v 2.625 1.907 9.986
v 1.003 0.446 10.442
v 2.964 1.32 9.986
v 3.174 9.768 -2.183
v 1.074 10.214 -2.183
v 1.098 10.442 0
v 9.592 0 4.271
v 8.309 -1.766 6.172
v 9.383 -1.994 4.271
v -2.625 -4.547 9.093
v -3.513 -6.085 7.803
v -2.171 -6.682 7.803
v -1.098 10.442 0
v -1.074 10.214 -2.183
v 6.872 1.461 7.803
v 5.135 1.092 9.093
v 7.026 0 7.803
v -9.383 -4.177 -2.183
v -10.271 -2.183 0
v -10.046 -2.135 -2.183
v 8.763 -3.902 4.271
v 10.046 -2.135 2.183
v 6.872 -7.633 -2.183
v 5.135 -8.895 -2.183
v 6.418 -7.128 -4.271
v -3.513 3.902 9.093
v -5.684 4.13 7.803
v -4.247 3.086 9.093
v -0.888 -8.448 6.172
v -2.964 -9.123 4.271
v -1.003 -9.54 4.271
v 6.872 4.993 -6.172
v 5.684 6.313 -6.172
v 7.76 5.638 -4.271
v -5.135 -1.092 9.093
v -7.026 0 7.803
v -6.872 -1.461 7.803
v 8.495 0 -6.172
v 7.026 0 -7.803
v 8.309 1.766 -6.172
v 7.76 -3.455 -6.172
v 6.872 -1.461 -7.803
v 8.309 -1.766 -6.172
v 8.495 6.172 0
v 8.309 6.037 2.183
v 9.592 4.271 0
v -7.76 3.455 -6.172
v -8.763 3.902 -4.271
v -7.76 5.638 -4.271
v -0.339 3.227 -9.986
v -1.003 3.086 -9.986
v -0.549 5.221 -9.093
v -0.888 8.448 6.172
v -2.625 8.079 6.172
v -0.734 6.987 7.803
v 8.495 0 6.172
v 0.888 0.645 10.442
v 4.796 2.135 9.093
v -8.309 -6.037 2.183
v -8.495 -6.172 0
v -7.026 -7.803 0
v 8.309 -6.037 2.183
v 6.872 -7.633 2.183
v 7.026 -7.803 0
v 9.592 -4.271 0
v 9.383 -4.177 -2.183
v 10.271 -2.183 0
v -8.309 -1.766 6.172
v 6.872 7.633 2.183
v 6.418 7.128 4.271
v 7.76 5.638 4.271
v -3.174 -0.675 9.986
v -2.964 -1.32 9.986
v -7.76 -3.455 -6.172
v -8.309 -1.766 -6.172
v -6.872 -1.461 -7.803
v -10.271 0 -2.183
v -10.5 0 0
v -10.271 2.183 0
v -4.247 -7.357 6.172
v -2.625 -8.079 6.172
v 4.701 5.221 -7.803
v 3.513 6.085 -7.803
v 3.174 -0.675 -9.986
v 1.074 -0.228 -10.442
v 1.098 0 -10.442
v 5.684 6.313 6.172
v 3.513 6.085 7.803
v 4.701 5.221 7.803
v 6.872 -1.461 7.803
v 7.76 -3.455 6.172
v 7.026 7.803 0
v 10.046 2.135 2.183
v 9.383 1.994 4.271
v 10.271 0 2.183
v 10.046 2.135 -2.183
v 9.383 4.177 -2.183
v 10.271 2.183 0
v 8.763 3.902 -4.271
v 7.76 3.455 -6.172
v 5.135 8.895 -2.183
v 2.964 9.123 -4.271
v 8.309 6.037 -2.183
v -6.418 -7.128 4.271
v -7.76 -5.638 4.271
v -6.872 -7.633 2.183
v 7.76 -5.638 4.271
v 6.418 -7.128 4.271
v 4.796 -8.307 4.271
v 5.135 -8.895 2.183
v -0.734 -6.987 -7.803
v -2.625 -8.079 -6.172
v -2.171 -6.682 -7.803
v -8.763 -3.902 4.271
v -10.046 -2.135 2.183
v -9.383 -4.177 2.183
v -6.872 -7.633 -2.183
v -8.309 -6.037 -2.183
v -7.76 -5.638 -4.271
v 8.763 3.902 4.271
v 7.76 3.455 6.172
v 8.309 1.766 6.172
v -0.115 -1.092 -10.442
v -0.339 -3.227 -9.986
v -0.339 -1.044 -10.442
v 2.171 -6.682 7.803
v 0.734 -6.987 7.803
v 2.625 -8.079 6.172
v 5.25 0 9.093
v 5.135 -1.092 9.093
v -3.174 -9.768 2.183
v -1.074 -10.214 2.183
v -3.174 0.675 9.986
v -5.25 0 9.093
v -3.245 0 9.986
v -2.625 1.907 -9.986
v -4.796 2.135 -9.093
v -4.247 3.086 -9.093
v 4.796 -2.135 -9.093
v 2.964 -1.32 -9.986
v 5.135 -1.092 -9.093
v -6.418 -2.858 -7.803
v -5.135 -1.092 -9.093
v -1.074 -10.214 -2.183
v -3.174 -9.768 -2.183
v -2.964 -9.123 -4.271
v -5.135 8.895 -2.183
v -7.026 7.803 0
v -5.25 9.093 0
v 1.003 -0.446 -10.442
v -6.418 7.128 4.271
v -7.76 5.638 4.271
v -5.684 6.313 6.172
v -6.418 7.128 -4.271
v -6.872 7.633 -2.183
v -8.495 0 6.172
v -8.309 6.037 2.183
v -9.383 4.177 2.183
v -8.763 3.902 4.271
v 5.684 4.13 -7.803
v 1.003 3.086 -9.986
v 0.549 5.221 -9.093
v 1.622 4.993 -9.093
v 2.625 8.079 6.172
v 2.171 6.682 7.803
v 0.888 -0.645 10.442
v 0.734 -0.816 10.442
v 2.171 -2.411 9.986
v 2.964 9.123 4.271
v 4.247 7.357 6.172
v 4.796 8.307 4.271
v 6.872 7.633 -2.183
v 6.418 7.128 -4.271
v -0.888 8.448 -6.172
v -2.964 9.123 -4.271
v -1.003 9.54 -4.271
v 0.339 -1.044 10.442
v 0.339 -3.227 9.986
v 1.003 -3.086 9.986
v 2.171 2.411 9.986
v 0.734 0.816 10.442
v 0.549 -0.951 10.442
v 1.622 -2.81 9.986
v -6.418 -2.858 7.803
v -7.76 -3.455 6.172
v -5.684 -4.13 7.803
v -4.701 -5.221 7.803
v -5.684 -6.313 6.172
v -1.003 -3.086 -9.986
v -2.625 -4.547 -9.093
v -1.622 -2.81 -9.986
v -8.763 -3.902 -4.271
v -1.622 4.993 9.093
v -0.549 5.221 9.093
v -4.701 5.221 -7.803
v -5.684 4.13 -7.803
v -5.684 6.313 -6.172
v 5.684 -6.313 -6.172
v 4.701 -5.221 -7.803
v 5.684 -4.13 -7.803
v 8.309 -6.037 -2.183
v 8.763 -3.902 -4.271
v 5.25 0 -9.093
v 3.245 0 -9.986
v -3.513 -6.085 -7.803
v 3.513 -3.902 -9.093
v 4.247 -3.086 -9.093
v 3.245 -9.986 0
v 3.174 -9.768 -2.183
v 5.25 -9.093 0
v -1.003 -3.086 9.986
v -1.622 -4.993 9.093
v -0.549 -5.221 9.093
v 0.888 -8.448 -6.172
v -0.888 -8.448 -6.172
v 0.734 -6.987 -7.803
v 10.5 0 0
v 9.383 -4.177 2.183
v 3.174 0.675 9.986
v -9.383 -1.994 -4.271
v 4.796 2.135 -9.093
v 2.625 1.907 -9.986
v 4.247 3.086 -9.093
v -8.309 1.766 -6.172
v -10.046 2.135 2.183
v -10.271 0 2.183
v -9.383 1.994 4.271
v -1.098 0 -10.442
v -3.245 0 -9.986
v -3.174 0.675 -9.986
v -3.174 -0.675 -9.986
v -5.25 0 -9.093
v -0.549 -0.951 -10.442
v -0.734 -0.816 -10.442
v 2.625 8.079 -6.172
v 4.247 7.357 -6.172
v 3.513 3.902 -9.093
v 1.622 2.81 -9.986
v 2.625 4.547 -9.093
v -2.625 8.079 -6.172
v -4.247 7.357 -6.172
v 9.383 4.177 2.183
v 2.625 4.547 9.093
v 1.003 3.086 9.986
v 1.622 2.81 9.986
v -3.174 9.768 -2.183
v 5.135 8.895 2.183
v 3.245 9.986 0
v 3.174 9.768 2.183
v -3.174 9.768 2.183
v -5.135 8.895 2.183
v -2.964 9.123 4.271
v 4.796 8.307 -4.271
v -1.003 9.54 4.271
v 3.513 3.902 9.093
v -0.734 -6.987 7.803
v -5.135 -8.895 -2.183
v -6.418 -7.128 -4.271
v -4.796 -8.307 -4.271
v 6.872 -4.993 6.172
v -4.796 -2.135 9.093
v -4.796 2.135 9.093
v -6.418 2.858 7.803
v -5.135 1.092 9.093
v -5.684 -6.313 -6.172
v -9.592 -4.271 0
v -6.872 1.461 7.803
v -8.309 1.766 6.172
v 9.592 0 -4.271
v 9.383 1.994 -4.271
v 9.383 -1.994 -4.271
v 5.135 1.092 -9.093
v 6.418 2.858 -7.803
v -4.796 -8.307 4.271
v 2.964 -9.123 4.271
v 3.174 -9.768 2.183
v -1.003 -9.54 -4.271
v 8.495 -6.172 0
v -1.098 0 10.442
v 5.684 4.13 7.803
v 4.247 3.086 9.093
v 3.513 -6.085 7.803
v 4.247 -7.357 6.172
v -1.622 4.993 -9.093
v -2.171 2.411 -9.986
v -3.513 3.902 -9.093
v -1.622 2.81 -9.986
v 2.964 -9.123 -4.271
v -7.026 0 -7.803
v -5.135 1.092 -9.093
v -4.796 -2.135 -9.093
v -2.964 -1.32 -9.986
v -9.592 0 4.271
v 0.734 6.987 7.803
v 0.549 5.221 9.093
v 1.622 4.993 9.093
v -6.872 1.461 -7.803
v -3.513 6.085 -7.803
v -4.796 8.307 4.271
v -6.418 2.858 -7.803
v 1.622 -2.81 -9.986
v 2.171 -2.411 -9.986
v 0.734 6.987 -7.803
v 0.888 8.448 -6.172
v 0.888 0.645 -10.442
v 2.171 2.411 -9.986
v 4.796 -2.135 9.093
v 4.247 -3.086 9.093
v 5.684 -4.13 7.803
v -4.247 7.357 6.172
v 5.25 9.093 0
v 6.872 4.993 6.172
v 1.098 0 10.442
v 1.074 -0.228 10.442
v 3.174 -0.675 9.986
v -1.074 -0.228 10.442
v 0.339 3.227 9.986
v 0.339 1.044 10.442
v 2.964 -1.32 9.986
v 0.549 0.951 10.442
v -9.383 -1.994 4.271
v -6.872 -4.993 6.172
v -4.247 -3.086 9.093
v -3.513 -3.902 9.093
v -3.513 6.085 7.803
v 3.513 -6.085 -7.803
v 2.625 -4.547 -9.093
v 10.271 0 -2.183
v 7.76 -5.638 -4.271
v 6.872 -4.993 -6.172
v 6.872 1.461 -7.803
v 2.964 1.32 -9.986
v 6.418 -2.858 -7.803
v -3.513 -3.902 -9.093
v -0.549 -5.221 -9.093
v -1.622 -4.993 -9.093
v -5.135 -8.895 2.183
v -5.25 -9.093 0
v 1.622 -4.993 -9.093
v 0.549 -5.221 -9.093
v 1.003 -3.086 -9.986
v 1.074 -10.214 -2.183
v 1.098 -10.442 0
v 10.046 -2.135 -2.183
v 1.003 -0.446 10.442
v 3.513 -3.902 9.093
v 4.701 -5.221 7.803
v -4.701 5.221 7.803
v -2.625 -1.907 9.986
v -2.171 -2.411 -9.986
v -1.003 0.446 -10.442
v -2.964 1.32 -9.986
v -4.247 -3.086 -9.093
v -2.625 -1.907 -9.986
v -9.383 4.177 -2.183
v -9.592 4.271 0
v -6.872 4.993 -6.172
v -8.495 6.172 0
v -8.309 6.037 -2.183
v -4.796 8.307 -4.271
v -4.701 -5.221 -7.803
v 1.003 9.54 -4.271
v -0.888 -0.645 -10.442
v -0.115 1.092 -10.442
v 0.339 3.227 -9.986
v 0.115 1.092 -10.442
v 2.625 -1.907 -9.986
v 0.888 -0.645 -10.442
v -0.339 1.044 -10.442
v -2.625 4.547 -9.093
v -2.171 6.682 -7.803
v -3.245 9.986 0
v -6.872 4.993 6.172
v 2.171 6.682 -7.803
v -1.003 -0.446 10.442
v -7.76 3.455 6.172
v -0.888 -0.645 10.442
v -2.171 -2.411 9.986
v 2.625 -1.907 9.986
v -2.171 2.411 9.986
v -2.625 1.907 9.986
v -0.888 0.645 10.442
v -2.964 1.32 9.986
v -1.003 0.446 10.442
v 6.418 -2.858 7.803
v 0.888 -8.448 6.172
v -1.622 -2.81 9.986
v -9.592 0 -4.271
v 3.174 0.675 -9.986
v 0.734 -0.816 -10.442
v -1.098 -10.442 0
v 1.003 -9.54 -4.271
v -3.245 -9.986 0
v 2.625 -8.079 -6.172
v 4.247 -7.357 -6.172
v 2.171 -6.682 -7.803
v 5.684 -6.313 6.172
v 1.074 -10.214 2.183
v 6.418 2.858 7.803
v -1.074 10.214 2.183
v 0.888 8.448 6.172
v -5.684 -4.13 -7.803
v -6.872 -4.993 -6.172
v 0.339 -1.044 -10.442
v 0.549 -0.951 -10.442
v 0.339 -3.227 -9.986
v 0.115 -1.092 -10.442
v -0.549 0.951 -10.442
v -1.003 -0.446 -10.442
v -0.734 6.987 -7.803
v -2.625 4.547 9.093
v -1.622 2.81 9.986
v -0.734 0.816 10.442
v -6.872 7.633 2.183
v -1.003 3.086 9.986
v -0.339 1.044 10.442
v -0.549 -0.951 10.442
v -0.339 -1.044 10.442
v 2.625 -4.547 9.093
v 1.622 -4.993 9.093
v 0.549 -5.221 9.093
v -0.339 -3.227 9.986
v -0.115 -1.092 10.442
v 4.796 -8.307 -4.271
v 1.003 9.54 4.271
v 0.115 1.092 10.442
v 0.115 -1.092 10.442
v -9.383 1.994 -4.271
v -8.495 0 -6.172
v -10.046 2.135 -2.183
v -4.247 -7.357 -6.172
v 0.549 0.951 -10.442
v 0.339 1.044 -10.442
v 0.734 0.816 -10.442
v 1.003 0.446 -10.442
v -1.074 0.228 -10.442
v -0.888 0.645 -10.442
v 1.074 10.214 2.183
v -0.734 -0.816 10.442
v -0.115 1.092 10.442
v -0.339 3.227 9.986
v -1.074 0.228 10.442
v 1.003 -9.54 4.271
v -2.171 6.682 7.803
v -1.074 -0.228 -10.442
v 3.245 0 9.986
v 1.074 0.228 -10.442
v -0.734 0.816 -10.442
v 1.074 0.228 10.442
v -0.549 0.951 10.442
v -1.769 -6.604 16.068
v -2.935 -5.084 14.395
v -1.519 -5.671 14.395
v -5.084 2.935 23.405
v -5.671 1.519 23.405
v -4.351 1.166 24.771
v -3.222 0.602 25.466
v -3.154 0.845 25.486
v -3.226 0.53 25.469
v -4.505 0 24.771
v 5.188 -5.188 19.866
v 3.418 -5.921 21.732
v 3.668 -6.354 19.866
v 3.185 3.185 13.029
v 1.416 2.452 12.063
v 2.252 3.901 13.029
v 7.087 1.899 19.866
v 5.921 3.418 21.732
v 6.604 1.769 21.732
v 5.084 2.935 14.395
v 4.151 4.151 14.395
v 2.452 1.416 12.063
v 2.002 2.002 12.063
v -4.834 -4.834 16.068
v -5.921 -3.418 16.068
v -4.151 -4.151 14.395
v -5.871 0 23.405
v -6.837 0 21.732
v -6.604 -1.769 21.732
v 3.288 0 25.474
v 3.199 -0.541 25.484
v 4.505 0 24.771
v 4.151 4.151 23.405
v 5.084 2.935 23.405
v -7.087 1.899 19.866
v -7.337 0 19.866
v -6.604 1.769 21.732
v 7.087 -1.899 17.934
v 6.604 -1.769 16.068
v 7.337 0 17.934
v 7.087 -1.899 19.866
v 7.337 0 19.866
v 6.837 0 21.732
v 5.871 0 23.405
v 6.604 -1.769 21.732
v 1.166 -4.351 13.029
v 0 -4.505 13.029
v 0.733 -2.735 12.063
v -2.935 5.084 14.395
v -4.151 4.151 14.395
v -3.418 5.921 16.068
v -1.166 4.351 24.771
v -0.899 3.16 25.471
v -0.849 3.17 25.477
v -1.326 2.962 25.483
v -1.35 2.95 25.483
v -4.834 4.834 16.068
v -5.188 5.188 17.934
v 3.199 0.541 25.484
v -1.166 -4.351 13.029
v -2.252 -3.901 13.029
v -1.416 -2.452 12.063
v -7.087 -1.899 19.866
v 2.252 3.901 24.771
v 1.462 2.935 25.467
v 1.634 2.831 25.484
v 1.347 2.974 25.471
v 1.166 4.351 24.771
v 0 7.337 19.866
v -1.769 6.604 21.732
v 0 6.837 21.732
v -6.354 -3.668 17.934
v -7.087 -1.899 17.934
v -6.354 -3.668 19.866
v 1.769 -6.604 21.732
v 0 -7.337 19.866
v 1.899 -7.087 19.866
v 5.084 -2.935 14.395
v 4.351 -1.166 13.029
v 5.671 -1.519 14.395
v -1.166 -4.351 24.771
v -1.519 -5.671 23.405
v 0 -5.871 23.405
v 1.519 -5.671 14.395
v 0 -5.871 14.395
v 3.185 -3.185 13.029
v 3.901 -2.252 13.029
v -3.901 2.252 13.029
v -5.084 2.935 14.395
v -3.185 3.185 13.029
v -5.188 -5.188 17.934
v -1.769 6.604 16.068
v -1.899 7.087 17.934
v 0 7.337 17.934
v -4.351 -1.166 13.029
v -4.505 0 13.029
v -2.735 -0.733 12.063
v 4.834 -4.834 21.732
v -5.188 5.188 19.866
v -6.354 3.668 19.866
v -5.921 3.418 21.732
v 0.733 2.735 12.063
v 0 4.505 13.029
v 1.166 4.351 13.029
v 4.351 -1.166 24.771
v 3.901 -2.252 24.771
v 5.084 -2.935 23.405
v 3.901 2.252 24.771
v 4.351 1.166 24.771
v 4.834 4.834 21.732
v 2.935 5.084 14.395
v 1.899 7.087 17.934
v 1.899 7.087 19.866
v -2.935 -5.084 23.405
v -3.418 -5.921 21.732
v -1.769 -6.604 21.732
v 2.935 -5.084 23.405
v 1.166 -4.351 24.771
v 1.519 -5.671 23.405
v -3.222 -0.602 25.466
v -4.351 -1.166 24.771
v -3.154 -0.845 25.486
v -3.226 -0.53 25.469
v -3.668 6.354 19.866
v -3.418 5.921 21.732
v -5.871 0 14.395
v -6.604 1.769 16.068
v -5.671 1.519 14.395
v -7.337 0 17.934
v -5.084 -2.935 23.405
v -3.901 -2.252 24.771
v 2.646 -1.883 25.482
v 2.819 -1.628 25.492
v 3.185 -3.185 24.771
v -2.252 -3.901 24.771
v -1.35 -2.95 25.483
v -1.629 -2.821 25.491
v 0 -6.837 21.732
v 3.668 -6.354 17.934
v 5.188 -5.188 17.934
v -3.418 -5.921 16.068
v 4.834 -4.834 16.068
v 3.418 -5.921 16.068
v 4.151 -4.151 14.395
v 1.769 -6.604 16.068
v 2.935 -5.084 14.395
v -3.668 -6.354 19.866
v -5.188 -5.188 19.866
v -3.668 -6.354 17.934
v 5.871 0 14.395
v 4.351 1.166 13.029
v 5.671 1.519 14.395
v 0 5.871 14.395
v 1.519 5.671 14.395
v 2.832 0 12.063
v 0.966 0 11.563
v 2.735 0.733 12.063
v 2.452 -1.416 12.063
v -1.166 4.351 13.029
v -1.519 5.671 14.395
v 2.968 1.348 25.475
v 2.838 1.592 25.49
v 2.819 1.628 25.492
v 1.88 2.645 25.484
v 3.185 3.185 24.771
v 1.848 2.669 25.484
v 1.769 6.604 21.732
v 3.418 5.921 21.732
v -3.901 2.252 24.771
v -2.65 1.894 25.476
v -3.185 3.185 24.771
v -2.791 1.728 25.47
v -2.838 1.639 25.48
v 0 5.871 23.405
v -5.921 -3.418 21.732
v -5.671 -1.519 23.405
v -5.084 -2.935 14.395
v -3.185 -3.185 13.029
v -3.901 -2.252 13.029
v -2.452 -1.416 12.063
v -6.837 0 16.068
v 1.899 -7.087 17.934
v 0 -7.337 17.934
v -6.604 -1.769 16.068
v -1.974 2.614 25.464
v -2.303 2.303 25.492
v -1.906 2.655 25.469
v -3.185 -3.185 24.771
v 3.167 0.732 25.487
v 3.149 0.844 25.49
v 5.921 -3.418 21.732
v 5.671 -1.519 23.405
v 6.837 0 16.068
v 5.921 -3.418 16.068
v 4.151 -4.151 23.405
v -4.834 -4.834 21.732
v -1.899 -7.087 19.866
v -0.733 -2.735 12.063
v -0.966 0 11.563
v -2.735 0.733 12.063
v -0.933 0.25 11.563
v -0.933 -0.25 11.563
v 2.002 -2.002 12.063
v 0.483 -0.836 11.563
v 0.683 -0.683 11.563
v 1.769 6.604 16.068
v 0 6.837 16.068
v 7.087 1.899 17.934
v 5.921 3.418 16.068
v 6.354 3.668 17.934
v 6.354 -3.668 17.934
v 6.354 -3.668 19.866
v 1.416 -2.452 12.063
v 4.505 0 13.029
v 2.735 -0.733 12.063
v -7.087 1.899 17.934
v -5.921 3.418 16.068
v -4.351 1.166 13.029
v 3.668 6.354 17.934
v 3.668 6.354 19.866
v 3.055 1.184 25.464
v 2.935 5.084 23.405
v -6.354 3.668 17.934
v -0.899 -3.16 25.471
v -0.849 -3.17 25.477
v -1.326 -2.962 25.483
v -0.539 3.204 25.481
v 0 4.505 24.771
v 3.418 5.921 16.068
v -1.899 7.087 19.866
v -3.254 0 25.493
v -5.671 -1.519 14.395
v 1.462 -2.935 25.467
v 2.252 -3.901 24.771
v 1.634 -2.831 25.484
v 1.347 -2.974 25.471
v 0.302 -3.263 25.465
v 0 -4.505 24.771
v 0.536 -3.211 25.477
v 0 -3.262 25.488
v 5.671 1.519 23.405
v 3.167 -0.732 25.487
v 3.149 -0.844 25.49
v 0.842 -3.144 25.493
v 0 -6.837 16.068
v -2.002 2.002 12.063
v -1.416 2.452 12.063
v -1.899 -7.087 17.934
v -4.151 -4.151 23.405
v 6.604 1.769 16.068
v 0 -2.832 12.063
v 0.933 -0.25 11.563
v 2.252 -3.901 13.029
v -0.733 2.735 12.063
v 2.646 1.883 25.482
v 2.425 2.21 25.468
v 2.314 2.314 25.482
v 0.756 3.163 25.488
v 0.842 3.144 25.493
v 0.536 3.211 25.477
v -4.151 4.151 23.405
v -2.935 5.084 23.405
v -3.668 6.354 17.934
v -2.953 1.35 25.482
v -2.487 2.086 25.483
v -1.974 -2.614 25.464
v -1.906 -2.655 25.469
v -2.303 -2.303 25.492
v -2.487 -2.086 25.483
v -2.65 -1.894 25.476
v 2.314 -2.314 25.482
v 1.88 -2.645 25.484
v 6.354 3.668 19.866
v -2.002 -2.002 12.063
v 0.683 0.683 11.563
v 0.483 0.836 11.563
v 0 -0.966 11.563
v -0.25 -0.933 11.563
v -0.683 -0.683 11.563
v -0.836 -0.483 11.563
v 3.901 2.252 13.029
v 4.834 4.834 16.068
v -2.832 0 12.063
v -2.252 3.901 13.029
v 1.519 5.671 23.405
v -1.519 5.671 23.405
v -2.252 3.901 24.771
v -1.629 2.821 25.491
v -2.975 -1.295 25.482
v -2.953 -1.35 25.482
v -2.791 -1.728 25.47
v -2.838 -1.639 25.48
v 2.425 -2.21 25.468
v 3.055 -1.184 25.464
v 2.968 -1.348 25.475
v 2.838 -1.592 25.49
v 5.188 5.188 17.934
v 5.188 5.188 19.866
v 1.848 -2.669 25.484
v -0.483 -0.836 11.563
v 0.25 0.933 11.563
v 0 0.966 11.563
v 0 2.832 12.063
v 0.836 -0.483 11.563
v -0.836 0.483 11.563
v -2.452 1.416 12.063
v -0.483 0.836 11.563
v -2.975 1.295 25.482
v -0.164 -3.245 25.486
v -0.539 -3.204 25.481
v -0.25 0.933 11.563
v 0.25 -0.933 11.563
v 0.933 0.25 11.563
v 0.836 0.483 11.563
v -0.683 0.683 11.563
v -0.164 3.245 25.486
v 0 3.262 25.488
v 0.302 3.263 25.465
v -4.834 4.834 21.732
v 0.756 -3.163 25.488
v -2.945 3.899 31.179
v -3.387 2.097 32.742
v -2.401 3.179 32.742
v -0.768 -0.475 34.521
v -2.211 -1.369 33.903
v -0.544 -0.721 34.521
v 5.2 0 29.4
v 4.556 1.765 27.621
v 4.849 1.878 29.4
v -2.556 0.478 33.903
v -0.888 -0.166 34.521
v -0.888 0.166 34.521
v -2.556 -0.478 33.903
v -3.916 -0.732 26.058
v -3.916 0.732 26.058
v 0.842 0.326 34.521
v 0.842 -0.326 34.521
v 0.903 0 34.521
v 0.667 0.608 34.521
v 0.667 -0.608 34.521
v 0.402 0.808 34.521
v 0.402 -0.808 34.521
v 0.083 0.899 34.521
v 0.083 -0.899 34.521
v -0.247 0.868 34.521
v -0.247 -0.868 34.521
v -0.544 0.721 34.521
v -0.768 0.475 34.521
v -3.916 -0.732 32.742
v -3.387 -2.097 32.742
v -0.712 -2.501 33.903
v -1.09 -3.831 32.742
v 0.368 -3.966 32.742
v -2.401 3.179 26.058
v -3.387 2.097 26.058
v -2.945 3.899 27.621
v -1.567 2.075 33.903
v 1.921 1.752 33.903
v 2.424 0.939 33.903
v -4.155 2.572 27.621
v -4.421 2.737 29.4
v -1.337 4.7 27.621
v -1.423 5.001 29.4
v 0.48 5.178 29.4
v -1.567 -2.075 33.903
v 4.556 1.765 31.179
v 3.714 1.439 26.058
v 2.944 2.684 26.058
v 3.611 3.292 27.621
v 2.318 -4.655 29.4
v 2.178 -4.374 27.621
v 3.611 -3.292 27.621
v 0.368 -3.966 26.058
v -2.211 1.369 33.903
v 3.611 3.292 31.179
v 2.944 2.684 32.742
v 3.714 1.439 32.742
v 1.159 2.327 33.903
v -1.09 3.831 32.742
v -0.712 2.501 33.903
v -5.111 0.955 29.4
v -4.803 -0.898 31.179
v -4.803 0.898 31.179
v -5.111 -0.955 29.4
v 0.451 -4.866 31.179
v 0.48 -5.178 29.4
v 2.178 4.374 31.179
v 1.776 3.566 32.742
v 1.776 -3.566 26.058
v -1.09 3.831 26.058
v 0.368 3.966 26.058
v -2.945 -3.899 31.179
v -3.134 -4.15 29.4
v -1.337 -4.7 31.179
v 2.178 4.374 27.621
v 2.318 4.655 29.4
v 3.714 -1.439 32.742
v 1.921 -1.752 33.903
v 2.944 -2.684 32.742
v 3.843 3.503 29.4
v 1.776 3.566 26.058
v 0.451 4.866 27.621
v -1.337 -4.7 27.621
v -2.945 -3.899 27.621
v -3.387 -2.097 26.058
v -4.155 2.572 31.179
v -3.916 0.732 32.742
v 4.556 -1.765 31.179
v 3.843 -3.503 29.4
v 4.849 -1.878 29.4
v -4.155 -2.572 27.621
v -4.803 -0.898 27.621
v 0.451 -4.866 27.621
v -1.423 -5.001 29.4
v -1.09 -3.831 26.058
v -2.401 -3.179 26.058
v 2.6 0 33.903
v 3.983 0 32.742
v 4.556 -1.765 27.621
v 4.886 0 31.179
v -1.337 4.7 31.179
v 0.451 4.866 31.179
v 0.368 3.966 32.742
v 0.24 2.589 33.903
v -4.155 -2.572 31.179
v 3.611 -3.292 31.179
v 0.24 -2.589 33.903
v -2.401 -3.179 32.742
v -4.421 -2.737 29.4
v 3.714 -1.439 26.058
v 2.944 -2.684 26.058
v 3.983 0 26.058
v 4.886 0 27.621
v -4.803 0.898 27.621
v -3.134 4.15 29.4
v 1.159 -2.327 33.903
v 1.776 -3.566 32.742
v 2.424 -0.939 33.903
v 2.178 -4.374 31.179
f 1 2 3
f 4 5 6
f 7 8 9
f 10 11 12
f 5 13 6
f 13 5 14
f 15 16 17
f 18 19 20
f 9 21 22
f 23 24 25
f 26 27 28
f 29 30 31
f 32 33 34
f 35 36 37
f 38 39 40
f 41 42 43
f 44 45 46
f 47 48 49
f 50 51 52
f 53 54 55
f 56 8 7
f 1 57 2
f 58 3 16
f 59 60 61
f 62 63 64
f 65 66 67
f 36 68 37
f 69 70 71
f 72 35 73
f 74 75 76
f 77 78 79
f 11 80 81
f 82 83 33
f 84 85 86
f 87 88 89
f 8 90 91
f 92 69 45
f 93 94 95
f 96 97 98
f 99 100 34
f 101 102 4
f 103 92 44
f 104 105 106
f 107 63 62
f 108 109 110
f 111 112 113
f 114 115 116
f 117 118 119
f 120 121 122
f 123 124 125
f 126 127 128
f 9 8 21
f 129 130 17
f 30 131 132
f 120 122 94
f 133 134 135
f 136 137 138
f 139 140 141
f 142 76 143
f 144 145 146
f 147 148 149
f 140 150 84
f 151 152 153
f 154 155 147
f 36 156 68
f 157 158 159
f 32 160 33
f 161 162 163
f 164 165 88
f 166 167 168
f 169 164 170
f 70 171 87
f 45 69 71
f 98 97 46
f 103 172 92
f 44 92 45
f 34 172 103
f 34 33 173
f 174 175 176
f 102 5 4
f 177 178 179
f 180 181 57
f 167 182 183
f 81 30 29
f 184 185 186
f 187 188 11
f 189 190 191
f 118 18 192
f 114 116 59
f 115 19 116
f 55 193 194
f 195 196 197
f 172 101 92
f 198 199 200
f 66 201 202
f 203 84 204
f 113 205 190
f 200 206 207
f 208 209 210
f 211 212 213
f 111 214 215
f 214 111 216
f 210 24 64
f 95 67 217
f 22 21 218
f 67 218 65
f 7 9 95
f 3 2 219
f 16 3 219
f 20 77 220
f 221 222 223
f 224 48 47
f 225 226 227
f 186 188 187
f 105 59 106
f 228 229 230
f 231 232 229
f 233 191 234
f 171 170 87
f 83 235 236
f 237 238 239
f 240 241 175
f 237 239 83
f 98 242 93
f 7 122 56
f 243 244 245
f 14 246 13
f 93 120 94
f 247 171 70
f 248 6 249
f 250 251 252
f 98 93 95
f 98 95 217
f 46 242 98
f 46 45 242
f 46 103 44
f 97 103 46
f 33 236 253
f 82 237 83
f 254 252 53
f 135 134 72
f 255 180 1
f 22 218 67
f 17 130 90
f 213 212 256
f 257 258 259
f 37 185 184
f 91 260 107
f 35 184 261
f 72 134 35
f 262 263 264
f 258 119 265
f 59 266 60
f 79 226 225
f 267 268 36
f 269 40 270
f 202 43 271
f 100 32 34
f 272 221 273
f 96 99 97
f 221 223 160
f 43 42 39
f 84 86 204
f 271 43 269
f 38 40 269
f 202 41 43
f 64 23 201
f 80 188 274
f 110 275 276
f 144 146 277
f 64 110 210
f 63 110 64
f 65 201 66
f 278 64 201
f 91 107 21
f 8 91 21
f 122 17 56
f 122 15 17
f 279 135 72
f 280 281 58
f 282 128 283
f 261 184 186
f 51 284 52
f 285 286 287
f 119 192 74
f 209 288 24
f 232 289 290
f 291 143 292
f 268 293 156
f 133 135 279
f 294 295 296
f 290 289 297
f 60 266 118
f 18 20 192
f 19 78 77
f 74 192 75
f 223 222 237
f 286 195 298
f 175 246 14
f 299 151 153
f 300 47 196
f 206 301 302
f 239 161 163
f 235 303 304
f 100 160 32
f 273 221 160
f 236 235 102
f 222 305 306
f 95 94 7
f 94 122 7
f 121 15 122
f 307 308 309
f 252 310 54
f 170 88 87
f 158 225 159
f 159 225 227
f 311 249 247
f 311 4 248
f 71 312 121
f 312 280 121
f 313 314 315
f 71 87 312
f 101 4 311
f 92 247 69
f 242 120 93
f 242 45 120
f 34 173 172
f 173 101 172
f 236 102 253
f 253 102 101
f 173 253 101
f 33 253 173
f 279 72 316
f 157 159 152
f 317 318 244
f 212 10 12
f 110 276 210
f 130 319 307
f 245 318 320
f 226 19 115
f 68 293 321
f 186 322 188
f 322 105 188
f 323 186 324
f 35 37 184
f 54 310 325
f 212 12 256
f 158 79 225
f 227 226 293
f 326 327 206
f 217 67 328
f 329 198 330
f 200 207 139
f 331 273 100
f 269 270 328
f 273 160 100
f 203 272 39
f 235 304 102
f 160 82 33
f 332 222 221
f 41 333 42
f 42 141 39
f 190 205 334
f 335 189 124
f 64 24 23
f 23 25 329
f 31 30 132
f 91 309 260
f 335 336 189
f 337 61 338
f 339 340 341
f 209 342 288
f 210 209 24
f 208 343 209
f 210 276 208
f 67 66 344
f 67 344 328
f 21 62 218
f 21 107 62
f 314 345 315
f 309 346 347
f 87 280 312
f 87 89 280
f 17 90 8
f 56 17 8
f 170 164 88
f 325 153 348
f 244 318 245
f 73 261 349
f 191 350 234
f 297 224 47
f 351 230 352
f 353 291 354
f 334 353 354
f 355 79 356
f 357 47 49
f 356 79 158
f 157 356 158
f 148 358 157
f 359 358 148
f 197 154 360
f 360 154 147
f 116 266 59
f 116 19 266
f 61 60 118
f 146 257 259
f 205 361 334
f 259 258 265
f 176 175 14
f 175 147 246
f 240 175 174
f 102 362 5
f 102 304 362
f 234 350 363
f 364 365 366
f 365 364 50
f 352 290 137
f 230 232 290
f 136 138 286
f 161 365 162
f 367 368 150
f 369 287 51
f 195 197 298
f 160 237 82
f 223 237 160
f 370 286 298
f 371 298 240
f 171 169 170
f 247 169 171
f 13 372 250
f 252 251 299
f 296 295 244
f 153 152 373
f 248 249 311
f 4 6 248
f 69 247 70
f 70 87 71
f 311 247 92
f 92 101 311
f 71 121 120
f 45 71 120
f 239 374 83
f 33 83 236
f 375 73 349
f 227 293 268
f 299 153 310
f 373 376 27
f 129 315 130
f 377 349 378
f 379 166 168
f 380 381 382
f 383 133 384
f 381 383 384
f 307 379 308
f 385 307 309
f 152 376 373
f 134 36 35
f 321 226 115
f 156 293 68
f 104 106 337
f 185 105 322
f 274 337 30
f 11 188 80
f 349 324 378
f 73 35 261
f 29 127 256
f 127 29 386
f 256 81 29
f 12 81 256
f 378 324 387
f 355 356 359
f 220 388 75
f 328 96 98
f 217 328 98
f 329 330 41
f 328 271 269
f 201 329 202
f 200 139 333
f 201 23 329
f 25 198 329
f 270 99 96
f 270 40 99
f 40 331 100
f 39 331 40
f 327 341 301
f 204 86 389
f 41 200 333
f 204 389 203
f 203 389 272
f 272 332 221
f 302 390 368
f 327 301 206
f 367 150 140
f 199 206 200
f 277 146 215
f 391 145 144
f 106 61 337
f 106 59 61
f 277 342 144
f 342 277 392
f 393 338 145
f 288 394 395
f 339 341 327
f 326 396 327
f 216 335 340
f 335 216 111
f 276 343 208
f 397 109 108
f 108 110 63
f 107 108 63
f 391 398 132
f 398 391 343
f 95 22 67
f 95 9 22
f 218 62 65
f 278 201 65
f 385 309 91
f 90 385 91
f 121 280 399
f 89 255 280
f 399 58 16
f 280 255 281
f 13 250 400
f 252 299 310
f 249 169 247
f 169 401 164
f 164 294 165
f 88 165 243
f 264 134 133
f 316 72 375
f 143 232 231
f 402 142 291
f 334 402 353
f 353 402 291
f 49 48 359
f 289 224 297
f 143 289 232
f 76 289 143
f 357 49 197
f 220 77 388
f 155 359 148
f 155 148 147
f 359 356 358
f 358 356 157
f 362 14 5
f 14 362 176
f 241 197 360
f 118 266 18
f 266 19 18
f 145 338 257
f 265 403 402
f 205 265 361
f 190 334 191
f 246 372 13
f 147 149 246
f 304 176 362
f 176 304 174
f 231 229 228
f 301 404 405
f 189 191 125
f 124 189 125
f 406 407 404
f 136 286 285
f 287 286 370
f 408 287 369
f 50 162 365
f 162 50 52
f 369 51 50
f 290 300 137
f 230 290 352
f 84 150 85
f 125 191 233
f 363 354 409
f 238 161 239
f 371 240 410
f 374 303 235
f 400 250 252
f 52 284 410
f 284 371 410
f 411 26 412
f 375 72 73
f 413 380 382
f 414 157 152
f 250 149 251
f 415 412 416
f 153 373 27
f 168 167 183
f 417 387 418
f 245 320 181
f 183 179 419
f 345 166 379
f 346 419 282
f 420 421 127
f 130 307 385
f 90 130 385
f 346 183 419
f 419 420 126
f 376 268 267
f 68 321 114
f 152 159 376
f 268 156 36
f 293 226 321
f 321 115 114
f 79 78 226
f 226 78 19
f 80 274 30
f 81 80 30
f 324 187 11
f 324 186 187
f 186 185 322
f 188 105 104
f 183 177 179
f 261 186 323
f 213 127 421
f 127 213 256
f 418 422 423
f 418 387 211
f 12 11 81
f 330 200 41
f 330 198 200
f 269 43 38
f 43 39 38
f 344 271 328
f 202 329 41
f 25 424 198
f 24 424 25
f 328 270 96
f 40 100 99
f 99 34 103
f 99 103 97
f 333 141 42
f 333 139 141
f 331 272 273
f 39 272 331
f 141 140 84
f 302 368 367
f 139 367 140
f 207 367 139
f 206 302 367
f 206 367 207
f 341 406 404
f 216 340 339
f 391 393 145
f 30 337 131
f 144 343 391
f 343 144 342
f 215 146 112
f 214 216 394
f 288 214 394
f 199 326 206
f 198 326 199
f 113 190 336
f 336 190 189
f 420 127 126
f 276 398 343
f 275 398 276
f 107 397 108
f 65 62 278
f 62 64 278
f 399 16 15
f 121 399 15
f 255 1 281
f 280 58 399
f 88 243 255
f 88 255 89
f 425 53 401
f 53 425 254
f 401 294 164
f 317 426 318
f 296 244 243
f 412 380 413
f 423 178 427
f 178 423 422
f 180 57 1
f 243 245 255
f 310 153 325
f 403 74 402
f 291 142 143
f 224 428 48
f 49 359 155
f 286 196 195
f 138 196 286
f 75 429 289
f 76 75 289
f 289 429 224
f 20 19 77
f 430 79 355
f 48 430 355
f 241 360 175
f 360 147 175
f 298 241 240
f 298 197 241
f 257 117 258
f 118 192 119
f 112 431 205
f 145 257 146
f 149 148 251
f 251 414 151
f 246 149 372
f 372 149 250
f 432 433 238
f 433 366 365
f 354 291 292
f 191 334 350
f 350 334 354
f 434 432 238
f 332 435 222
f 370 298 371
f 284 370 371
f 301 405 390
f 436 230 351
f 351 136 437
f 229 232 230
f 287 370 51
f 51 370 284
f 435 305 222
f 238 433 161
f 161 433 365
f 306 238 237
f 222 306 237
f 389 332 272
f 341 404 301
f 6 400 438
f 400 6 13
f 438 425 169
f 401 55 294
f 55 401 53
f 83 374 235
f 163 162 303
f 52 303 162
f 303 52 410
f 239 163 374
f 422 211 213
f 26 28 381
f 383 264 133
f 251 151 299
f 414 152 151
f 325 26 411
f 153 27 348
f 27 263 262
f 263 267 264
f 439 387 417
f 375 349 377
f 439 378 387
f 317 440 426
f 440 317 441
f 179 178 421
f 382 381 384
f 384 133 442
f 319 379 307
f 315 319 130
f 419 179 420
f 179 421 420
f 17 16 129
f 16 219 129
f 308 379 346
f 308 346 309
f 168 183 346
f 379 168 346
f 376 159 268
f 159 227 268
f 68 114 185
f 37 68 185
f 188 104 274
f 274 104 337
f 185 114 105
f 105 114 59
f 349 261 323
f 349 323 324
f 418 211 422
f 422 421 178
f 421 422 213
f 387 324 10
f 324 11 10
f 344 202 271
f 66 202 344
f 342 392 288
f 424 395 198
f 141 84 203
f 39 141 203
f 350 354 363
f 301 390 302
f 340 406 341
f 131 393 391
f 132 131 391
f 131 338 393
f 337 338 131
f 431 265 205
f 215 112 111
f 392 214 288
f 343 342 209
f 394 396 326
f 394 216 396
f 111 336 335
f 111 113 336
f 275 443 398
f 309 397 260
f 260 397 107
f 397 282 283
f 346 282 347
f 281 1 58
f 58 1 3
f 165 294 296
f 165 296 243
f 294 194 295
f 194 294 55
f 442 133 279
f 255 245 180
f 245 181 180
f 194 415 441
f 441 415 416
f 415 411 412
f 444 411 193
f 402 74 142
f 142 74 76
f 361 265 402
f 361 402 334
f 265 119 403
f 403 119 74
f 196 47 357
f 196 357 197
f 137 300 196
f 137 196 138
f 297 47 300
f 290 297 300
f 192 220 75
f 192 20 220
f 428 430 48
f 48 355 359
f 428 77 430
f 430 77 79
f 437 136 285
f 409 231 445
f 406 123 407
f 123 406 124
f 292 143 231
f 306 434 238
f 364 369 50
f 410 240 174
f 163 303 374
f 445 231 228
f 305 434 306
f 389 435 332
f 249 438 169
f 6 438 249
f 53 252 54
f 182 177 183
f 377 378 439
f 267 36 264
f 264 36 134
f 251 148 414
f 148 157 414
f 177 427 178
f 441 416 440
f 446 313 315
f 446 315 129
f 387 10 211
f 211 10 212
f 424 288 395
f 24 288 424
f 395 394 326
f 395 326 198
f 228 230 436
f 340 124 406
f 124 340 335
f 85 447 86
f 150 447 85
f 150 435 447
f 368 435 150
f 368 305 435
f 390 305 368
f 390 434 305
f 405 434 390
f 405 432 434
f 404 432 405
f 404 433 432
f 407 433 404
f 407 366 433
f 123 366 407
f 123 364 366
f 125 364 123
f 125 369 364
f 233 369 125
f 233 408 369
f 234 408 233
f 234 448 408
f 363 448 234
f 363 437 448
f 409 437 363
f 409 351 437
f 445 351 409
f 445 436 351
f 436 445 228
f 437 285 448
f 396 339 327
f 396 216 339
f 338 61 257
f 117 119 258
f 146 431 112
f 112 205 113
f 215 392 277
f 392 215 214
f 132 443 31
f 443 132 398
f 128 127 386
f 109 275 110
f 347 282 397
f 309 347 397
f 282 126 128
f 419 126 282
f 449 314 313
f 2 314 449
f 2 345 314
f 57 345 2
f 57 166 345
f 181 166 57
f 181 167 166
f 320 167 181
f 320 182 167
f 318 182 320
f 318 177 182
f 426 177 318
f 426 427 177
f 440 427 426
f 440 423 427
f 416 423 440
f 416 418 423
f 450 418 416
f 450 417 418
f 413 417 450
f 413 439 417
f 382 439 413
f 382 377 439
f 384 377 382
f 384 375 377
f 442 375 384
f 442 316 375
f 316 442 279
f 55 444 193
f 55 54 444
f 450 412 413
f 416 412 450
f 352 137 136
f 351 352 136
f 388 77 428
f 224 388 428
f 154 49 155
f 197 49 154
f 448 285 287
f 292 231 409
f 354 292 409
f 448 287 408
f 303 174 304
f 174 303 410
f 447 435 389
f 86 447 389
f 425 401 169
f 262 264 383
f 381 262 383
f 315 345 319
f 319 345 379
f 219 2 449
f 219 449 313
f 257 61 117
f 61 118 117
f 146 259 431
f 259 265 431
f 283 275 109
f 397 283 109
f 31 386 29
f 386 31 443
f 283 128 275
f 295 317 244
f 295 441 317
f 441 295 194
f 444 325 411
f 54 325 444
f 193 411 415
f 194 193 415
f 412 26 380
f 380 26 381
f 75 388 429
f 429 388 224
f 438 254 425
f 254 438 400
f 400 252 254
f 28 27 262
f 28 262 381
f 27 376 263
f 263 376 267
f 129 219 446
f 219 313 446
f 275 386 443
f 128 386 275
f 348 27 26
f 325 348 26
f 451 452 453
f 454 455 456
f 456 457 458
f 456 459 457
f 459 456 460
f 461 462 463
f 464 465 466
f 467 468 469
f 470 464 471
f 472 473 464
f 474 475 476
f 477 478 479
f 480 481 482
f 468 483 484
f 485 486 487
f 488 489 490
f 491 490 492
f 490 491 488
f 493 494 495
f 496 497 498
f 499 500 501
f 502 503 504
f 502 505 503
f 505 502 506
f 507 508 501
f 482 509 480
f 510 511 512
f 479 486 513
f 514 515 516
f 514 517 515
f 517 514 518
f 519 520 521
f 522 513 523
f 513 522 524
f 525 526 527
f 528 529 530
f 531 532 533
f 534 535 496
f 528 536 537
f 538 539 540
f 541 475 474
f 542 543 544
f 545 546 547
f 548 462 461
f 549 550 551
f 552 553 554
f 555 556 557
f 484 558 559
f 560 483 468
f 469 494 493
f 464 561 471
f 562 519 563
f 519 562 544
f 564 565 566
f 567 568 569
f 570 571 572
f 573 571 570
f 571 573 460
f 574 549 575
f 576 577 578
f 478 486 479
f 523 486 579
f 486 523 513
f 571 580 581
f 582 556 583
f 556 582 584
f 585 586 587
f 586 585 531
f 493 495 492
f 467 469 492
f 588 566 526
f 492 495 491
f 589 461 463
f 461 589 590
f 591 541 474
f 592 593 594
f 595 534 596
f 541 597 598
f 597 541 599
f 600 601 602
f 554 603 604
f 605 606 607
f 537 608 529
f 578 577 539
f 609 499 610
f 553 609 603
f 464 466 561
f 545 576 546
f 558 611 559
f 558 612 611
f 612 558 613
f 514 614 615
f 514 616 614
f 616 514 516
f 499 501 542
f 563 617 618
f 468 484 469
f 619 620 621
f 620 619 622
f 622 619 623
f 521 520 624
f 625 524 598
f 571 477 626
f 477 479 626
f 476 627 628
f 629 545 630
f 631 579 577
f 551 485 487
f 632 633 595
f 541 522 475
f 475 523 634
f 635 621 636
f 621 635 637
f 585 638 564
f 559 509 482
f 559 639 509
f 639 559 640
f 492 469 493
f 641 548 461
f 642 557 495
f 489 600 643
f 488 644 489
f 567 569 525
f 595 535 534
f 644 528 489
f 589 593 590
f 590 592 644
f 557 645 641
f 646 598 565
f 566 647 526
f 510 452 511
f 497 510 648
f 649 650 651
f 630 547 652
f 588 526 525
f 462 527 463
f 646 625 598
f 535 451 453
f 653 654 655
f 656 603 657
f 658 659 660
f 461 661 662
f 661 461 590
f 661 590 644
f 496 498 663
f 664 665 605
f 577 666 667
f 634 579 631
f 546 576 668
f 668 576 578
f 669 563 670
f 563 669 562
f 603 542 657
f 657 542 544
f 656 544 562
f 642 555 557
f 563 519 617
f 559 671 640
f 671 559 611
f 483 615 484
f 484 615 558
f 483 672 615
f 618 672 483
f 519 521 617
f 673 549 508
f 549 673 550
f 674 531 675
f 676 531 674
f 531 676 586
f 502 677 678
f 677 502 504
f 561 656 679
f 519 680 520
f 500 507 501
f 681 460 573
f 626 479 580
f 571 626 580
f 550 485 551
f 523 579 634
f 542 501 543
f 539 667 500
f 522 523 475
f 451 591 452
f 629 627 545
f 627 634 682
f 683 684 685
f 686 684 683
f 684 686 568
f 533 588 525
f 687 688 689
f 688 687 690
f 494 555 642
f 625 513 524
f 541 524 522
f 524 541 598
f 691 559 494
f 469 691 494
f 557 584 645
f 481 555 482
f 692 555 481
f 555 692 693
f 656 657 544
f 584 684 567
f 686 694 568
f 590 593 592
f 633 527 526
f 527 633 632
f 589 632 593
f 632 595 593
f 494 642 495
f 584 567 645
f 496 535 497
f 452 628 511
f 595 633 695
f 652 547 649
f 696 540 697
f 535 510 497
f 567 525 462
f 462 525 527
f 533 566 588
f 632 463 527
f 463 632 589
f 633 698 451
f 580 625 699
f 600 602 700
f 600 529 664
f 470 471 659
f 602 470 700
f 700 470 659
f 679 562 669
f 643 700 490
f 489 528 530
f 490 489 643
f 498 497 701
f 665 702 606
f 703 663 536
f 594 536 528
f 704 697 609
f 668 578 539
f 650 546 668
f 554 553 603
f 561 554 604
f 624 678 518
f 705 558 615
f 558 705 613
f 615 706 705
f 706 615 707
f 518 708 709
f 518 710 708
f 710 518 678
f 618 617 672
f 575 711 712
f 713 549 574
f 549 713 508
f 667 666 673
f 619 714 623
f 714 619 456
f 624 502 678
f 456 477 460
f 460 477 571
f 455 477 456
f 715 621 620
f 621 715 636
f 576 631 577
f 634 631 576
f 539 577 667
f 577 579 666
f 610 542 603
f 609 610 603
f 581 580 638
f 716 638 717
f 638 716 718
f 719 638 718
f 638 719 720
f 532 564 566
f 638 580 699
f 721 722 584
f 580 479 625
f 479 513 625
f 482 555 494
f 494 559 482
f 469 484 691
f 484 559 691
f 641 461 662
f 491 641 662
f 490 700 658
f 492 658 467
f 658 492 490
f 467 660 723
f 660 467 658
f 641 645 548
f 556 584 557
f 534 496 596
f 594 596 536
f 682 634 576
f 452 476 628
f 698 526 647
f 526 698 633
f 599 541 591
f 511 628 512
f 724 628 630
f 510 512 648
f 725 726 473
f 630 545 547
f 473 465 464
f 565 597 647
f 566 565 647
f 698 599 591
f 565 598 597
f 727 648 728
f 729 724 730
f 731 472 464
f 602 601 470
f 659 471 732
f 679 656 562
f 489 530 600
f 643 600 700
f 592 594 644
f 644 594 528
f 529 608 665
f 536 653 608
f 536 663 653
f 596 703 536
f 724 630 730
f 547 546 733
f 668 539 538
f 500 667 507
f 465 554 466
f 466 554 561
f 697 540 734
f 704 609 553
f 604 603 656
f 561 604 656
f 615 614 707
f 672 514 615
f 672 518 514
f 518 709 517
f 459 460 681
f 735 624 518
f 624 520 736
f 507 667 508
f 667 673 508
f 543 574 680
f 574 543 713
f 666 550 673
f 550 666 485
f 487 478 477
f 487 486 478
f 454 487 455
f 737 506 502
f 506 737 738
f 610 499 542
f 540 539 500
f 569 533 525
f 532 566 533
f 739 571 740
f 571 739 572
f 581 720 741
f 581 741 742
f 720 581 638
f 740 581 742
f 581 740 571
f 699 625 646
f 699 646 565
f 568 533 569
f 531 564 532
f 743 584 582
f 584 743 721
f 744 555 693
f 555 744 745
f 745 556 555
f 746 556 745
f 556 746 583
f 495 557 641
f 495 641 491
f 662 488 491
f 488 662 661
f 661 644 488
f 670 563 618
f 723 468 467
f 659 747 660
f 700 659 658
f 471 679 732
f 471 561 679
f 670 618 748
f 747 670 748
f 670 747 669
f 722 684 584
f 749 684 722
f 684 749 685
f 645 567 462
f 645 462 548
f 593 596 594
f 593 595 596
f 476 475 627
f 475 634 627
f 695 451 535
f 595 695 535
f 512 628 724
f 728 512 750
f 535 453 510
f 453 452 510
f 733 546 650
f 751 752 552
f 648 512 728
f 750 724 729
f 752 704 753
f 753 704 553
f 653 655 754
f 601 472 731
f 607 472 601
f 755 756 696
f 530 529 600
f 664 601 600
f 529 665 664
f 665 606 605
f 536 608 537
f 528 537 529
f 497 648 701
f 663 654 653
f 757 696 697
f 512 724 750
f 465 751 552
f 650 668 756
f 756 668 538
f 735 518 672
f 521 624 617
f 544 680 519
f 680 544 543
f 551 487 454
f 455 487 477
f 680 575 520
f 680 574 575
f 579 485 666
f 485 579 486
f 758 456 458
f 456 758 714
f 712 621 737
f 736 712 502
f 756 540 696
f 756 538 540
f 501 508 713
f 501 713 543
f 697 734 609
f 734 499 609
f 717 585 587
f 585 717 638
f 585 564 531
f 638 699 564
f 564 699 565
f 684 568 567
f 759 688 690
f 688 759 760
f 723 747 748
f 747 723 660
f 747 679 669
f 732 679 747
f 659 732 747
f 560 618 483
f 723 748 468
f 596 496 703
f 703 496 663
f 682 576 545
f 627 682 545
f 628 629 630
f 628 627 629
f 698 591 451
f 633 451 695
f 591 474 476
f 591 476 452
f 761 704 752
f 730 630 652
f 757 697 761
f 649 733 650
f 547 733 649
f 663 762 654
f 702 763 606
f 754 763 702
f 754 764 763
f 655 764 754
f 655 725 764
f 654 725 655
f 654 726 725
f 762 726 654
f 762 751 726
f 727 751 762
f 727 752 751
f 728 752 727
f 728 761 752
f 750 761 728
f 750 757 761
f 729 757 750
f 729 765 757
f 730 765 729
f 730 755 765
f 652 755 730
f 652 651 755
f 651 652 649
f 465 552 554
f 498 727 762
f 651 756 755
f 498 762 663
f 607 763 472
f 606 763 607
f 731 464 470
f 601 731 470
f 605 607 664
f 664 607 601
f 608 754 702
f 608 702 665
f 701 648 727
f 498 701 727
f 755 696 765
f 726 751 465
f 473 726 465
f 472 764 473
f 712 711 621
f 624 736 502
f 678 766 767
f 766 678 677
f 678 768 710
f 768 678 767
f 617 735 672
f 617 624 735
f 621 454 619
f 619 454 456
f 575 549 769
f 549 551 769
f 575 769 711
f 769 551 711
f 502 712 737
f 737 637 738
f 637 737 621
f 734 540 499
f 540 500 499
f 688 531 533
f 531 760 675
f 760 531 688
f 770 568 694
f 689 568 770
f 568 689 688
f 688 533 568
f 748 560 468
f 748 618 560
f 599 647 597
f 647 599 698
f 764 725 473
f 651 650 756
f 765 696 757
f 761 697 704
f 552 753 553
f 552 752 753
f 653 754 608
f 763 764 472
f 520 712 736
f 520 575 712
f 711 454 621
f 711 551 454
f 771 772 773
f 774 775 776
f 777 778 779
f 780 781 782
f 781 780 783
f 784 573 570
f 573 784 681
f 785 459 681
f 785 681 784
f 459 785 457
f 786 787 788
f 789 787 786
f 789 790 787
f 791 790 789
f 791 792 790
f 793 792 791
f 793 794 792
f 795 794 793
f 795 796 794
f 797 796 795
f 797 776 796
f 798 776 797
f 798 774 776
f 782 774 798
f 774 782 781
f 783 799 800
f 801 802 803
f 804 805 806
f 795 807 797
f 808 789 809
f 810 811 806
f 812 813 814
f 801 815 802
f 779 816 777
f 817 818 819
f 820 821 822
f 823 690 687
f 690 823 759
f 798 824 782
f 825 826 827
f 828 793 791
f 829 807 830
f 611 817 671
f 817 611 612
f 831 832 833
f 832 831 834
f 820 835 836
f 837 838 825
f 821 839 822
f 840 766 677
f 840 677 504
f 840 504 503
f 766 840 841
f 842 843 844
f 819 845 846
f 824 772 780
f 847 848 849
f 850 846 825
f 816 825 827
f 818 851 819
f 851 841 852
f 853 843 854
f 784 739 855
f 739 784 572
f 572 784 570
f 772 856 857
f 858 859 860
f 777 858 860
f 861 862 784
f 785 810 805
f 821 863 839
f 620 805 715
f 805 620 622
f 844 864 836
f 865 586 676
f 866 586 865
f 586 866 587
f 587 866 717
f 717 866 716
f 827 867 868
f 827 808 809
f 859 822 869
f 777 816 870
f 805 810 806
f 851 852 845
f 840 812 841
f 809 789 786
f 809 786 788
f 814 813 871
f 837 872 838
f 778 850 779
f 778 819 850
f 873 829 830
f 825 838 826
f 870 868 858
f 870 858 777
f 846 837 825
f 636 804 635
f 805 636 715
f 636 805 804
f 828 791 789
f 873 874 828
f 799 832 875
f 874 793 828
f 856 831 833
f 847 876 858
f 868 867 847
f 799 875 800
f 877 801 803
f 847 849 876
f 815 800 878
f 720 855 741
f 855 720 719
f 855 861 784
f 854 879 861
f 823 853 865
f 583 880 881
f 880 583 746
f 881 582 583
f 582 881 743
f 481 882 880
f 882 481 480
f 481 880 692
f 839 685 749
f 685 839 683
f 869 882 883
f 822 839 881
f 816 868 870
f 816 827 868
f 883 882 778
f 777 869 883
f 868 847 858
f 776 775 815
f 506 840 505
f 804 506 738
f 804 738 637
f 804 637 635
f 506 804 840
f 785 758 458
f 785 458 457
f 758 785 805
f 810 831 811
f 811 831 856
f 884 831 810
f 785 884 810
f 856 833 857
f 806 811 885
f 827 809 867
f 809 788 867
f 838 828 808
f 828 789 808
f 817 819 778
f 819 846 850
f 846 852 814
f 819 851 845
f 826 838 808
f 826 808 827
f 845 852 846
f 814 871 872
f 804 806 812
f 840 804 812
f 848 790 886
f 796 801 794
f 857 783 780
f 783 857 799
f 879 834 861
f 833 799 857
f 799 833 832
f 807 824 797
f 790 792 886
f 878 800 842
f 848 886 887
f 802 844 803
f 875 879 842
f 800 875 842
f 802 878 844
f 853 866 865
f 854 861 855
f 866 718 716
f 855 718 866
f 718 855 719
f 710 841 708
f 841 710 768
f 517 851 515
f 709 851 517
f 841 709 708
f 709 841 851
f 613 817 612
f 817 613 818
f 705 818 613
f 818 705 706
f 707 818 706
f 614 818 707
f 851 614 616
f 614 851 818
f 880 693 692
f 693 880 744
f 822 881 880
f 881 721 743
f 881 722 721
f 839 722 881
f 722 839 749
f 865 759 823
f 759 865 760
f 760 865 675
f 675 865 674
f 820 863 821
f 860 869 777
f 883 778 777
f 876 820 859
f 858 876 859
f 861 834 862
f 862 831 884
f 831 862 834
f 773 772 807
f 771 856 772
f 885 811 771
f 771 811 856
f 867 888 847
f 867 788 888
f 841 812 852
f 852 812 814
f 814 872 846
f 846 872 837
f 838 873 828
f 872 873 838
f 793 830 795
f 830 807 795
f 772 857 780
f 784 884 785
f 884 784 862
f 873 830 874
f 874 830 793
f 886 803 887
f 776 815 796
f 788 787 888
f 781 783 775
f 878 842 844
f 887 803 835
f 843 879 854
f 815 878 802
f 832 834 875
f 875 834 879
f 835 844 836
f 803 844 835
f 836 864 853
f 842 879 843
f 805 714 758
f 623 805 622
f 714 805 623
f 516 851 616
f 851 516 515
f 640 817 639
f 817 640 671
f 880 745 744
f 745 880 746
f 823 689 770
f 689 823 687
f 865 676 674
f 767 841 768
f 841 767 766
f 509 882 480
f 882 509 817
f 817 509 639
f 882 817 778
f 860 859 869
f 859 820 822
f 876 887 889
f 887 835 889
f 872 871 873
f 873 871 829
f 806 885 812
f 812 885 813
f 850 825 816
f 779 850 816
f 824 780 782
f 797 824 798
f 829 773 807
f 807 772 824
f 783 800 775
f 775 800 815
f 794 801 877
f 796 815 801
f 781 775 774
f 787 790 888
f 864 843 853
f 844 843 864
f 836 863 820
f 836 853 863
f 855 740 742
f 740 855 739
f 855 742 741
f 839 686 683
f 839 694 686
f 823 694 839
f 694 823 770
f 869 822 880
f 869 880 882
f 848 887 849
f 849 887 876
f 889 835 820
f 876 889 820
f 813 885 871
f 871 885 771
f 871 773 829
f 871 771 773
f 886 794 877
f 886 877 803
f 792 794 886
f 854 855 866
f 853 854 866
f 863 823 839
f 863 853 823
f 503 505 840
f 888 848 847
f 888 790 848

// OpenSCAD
union() {
  sphere(r=10.5);
  translate([0.0,0.0,18.9]) sphere(r=7.4);
  translate([0.0,0.0,29.4]) sphere(r=5.2);
}
